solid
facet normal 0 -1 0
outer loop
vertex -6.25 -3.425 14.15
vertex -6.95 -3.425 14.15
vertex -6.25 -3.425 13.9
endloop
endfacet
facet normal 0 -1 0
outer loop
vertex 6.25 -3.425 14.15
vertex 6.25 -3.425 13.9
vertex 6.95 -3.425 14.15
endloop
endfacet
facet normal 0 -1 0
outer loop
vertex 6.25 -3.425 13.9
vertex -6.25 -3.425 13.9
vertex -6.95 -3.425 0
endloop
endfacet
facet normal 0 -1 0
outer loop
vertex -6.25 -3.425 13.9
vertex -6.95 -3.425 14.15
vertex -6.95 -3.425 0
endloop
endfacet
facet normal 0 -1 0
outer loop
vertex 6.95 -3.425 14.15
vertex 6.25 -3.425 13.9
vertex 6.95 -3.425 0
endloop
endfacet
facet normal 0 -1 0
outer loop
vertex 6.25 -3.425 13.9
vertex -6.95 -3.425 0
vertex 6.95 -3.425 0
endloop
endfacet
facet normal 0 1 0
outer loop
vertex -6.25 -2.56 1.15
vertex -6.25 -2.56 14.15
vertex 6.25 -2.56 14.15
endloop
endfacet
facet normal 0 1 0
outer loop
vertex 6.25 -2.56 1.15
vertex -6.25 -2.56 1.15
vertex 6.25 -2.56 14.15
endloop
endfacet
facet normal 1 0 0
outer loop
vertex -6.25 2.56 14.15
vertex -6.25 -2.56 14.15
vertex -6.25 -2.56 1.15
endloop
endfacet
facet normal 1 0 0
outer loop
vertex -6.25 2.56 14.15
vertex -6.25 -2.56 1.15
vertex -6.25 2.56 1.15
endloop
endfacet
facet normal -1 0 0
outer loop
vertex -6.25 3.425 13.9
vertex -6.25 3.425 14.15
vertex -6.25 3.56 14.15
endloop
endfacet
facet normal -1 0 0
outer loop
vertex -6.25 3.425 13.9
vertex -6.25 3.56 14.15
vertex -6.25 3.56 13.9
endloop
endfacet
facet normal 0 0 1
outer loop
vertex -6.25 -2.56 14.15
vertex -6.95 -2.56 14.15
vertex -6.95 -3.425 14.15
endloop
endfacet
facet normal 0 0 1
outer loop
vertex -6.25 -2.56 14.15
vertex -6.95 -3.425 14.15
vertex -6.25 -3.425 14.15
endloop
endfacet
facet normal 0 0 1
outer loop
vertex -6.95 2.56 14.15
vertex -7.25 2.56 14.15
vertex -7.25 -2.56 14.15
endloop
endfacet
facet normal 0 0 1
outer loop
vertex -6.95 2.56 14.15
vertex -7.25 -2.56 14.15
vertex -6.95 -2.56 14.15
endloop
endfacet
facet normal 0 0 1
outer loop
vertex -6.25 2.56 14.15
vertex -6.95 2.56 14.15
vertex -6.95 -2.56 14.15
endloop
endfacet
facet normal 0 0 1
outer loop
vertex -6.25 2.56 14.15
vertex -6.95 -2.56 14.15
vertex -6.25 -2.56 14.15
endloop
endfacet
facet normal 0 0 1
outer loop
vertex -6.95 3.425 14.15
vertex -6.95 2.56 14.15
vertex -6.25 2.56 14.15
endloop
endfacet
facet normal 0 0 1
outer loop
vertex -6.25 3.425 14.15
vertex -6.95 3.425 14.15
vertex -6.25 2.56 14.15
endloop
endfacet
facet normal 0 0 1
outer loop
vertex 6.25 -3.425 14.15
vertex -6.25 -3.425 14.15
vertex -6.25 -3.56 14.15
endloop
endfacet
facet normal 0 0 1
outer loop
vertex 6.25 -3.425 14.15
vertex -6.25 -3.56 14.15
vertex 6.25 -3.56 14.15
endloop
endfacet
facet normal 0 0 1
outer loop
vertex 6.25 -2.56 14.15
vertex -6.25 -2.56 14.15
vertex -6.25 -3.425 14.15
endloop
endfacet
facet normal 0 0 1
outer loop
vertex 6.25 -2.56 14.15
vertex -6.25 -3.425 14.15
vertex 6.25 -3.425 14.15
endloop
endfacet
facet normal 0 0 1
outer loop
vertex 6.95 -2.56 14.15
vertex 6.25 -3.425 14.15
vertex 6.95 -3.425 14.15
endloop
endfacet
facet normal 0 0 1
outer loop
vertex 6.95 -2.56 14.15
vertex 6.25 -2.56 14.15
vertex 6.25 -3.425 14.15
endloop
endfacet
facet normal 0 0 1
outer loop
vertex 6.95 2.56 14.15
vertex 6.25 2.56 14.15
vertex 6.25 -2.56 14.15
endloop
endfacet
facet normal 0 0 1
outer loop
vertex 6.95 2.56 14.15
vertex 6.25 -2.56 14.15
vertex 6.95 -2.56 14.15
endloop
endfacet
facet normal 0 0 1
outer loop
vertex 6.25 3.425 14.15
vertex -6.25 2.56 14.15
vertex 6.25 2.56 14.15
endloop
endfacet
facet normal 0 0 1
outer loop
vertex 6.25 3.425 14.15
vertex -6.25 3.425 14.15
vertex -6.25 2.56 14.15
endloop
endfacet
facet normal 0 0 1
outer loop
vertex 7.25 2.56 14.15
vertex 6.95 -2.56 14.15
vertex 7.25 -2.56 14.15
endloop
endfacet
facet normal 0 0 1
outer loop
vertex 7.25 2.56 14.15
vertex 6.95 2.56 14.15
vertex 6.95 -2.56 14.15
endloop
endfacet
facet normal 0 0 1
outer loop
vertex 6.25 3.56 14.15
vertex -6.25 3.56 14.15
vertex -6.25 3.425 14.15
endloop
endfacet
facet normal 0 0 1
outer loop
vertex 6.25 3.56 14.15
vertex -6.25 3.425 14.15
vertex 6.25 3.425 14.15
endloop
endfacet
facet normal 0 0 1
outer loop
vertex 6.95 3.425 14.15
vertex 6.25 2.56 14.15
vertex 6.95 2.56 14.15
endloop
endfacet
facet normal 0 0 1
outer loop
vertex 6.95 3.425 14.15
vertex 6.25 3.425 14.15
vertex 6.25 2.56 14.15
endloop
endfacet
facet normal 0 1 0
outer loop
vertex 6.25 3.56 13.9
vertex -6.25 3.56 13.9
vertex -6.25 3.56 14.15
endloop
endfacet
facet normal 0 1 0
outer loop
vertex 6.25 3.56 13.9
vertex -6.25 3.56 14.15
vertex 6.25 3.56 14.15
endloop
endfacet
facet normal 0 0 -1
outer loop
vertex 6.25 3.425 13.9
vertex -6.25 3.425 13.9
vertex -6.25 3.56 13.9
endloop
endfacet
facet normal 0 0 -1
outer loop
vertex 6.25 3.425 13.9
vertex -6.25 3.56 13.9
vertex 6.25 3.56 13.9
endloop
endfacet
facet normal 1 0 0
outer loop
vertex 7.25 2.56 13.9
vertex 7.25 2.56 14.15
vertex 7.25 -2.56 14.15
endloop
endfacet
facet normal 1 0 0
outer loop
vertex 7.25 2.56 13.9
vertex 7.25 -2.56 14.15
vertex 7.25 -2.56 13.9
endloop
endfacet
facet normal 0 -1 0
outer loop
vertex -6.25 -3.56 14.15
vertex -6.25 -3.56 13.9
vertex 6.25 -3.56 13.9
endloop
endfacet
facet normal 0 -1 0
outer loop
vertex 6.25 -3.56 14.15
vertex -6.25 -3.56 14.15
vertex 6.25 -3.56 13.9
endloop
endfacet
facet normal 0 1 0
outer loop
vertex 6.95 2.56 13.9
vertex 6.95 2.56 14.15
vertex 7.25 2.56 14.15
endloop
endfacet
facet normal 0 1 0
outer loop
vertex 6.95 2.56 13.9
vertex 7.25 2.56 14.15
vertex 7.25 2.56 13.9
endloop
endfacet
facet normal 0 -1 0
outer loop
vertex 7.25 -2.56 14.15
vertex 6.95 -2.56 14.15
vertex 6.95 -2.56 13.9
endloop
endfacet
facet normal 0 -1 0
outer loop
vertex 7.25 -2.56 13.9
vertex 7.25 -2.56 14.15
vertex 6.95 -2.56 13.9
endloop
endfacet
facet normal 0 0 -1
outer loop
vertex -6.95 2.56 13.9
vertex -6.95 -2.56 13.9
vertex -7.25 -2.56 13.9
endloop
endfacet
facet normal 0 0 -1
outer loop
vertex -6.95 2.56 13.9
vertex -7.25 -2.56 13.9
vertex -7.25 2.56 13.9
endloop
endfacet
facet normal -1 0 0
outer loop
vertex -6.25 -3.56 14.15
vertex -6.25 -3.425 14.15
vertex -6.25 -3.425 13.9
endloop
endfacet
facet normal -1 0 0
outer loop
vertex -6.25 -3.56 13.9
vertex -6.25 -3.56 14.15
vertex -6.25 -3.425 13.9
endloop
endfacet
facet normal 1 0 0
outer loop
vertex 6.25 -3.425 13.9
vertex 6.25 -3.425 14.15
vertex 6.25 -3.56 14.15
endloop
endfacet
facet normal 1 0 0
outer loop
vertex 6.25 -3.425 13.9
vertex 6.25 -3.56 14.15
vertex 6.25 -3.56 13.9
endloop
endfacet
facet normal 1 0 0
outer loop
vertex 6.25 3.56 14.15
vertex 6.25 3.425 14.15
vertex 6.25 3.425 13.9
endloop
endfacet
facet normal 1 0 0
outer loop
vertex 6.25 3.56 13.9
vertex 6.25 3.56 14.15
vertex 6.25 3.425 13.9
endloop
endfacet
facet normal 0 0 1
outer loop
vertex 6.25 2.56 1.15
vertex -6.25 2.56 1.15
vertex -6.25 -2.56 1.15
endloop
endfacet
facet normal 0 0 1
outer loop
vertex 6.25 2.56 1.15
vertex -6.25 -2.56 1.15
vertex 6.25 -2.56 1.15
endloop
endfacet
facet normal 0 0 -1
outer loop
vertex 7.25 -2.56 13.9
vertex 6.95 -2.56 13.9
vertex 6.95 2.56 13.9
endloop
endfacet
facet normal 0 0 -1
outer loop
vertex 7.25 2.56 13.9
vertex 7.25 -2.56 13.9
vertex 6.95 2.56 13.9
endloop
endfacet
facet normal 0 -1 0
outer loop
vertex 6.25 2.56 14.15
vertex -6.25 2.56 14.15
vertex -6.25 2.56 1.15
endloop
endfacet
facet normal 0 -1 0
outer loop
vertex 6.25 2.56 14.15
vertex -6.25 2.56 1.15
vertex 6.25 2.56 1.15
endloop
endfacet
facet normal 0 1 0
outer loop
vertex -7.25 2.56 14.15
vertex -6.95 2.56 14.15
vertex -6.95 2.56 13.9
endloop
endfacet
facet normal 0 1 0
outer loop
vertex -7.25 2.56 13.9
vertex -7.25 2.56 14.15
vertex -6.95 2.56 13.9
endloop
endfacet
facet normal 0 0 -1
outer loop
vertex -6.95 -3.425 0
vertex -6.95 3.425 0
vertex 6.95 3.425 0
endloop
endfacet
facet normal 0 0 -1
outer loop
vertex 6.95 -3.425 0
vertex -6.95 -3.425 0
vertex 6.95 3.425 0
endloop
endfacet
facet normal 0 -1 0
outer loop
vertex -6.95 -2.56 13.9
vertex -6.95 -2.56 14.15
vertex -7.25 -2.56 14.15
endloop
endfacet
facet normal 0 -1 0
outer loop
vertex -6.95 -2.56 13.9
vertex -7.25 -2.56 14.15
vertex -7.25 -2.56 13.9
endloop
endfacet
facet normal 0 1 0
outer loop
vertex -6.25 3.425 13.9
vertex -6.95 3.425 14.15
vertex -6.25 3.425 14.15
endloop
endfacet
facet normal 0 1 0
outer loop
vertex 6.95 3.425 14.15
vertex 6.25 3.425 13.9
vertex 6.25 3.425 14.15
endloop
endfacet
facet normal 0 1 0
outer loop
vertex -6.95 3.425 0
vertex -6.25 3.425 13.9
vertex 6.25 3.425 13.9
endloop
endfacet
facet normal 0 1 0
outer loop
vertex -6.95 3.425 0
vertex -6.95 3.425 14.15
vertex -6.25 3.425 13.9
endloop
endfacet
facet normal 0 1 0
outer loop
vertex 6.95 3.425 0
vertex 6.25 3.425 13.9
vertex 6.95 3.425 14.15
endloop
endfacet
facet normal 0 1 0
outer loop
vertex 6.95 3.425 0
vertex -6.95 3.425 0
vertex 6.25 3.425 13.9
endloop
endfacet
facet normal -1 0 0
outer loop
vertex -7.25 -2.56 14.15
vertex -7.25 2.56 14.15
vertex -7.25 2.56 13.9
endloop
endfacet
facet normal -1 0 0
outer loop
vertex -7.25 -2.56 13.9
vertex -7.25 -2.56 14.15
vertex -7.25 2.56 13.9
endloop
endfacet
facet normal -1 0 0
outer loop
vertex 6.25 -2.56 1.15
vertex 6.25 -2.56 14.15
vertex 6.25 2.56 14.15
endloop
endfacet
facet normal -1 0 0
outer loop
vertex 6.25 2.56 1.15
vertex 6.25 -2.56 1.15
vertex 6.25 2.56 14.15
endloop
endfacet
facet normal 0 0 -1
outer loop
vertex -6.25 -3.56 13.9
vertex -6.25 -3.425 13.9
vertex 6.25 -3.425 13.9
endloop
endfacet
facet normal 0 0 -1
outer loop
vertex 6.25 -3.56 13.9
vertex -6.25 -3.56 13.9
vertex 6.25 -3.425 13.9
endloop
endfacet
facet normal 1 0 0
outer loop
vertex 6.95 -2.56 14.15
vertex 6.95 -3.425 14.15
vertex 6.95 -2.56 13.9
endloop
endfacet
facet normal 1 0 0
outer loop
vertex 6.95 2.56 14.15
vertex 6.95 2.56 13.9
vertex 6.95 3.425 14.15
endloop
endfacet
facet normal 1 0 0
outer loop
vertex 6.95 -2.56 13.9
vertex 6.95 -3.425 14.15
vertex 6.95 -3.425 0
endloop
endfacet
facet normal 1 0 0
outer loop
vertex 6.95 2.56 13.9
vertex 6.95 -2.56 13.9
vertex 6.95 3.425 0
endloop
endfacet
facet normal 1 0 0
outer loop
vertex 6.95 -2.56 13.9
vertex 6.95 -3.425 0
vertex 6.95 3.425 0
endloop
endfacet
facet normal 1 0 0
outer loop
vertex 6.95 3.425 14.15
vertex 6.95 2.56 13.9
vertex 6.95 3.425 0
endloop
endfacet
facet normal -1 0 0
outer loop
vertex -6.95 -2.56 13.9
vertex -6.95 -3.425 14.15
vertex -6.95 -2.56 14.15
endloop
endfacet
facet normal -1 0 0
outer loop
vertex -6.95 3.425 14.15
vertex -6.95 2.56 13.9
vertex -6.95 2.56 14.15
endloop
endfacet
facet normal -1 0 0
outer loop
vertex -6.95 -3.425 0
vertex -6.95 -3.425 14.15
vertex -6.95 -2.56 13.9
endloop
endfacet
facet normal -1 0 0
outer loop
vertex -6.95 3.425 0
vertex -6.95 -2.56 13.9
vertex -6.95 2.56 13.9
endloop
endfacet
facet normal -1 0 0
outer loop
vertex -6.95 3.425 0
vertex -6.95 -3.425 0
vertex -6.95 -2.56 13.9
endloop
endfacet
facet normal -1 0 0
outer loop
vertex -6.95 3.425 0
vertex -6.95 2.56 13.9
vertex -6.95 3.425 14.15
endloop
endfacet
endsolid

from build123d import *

# Parameters (mm, degrees)
SKETCH1_W           = 13.9
SKETCH1_H           = 6.85
BOSS_EXTRUDE1_DEPTH = 14.15
SKETCH2_W           = 12.5
SKETCH2_H           = 5.12
CUT_EXTRUDE1_DEPTH  = 13
SKETCH4_W           = 12.5
SKETCH4_H           = 0.25
BOSS_EXTRUDE2_DEPTH = 0.135
SKETCH5_W           = 0.25
SKETCH5_H           = 5.12
BOSS_EXTRUDE3_DEPTH = 0.3


with BuildPart() as part:
    # Sketch1 → Boss-Extrude1 (new body)
    with BuildSketch(Plane.XY):
        Rectangle(SKETCH1_W, SKETCH1_H)
    extrude(amount=BOSS_EXTRUDE1_DEPTH)

    # Sketch2 → Cut-Extrude1 (cut)
    with BuildSketch(Plane.XY.offset(14.15)):
        Rectangle(SKETCH2_W, SKETCH2_H)
    extrude(amount=-CUT_EXTRUDE1_DEPTH, mode=Mode.SUBTRACT)

    # Sketch4 → Boss-Extrude2 (add)
    with BuildSketch(Plane(origin=(0, 3.425, 0), x_dir=(1, 0, 0), z_dir=(0, 1, 0))):
        with Locations((0, -14.025)):
            Rectangle(SKETCH4_W, SKETCH4_H)
    boss_extrude2 = extrude(amount=BOSS_EXTRUDE2_DEPTH)

    # Mirror1: Boss-Extrude2 across plane
    add(boss_extrude2.mirror(Plane.ZX))

    # Sketch5 → Boss-Extrude3 (add)
    with BuildSketch(Plane(origin=(6.95, 0, 0), x_dir=(0, 0, -1), z_dir=(1, 0, 0))):
        with Locations((-14.025, 0)):
            Rectangle(SKETCH5_W, SKETCH5_H)
    boss_extrude3 = extrude(amount=BOSS_EXTRUDE3_DEPTH)

    # Mirror2: Boss-Extrude3 across plane
    add(boss_extrude3.mirror(Plane(origin=(0, 0, 0), x_dir=(0, 0, 1), z_dir=(1, 0, 0))))


solid = part.part
